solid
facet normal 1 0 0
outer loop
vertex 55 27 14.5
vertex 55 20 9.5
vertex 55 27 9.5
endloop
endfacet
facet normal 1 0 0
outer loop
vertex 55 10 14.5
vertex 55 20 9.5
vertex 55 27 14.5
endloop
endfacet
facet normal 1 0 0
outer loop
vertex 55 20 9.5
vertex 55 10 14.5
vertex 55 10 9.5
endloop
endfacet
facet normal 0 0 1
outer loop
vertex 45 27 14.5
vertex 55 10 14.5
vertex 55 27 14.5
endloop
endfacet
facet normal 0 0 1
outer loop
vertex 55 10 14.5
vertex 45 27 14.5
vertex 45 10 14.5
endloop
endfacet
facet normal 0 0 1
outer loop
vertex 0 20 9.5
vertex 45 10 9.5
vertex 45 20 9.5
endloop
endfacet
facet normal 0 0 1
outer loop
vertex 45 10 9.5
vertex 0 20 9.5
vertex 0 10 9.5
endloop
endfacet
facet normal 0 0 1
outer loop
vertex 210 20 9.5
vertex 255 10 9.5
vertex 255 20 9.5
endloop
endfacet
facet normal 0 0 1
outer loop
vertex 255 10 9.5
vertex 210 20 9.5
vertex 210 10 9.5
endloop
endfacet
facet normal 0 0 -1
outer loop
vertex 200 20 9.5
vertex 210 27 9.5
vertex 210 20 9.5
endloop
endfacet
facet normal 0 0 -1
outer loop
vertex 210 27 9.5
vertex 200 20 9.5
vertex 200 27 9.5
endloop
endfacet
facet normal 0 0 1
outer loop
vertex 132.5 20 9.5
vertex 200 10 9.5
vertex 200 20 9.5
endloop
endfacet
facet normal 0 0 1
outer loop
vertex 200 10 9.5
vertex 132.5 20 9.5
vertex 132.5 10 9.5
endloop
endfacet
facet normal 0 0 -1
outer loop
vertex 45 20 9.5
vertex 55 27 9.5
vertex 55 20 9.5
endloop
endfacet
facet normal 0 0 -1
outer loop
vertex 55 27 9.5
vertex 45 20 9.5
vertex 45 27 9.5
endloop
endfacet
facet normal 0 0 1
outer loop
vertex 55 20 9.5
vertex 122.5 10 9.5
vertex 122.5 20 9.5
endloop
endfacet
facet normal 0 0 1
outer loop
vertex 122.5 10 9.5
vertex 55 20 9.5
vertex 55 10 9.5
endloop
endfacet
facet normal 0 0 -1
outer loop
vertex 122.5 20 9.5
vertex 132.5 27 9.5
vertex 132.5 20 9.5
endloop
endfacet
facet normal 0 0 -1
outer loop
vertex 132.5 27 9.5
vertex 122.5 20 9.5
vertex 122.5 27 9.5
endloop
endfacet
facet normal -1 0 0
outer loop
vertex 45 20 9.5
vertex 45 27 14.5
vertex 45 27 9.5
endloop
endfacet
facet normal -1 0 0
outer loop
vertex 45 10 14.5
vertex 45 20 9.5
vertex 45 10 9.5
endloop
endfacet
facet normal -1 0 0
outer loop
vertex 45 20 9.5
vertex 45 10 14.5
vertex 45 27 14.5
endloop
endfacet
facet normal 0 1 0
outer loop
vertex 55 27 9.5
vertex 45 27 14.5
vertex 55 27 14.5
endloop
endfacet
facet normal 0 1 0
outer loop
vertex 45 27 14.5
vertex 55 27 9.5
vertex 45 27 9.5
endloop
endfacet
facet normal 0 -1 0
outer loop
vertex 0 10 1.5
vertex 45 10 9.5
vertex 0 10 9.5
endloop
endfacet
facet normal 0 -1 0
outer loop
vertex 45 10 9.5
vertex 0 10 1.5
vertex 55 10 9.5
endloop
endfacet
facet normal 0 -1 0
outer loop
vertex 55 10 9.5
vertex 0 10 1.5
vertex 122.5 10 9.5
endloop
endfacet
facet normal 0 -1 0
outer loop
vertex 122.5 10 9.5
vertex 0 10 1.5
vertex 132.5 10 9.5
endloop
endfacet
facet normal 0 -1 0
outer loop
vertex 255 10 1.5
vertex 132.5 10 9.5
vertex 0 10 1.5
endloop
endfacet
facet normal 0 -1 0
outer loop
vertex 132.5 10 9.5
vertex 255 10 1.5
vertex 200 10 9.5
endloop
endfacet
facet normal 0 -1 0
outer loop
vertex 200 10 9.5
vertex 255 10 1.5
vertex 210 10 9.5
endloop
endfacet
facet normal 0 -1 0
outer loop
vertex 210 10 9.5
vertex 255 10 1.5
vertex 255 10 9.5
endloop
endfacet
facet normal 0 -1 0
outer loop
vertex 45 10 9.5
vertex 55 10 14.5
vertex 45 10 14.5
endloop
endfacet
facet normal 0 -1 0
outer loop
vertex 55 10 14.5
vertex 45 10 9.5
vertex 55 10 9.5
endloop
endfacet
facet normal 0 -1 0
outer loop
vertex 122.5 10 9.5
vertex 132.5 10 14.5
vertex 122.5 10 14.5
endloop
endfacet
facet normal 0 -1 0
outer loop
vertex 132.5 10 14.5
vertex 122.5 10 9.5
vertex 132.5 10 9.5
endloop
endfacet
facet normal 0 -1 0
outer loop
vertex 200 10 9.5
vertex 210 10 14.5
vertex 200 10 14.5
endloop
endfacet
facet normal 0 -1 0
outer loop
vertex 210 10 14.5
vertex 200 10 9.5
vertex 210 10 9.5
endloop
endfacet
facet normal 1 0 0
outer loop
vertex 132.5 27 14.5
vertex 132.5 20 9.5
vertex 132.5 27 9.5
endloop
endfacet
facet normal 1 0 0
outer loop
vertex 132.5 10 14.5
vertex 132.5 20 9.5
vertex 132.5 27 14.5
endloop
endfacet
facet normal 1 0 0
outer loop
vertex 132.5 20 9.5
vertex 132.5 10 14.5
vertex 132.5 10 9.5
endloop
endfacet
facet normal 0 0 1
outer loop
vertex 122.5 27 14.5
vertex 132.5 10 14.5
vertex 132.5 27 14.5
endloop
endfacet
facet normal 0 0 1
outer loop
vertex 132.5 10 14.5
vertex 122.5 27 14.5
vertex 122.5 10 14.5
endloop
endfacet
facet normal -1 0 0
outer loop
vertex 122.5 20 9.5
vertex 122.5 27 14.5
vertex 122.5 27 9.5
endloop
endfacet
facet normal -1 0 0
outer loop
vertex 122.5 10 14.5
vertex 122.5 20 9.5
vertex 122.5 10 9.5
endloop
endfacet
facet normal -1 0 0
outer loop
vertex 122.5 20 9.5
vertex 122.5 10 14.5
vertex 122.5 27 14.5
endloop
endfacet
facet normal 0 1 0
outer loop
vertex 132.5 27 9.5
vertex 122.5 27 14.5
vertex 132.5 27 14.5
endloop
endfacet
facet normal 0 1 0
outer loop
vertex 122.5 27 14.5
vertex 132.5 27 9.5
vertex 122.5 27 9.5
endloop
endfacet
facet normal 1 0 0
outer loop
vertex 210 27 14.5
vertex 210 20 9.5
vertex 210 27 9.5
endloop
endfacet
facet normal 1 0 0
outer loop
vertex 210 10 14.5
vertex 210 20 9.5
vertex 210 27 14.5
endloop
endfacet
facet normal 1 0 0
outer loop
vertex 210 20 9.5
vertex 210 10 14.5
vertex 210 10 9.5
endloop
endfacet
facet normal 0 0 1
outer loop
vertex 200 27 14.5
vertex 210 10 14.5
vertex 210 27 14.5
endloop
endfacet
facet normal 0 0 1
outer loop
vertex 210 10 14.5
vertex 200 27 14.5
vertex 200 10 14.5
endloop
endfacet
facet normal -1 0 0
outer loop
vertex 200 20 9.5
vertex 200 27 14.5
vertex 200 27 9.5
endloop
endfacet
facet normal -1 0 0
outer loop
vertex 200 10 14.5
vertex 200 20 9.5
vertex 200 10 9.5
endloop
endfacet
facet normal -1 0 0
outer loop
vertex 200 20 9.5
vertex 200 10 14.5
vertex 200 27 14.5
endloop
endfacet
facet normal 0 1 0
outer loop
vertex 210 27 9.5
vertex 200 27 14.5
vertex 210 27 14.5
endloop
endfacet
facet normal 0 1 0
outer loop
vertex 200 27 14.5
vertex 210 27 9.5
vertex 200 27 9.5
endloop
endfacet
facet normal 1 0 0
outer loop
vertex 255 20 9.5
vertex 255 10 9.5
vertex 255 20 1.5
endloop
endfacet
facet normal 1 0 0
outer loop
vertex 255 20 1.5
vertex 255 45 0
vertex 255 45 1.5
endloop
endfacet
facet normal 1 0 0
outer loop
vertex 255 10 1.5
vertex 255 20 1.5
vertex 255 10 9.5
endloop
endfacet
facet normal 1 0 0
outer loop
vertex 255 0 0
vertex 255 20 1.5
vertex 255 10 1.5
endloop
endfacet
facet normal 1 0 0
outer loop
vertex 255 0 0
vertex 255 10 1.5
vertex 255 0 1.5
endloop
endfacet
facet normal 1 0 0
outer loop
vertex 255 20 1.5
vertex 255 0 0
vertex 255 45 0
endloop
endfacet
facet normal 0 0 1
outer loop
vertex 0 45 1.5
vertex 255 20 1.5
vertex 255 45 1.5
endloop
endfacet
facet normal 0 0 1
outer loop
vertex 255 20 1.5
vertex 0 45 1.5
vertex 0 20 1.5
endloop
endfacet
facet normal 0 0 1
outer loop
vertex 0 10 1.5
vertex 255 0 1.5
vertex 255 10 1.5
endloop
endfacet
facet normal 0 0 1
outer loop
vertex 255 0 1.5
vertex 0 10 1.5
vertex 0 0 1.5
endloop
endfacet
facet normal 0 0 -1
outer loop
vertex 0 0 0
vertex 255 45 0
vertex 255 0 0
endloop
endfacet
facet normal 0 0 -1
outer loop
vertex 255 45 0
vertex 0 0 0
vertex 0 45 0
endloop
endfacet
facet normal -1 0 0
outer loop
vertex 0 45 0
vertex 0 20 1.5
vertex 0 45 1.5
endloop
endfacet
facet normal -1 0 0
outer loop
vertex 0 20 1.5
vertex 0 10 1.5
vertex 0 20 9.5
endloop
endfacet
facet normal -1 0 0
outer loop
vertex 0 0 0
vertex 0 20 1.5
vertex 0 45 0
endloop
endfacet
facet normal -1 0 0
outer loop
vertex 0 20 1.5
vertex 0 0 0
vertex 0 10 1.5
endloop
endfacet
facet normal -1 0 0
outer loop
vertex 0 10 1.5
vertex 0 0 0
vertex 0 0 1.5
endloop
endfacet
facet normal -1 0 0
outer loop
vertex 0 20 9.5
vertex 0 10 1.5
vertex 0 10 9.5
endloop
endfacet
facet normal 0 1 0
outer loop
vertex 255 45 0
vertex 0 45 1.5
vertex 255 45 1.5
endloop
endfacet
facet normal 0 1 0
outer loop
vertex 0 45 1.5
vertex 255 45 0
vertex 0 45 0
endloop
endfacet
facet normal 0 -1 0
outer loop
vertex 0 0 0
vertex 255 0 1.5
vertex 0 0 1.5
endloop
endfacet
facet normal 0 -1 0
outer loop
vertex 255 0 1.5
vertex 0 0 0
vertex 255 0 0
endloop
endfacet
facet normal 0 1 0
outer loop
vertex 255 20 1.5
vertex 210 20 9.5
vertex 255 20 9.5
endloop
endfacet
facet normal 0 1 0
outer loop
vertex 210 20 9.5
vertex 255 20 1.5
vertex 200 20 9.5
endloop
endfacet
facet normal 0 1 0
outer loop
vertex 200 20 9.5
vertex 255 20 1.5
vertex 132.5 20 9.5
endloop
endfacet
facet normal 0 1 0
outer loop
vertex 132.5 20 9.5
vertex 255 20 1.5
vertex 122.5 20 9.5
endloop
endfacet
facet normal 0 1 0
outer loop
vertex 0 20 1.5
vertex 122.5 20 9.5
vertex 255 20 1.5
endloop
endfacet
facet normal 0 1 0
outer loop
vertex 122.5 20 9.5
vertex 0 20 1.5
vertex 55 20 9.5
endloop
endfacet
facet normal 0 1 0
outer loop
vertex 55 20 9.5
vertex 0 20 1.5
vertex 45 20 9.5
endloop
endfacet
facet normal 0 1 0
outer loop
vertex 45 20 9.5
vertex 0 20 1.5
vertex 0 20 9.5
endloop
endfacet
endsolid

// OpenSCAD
hh = 25;        // hooks height
pl = 259-2*2;   // plane length
sw = 10;        // support width

// main plane (to be glued to the wall)
cube([pl, 45, 1.5]);
// support shelf
translate([0, 10, 1.5])
  cube([pl, 10, 8]);

// hooks
for(x = [45, pl/2-sw/2, pl-45-sw])
  translate([x, 10, 1.5+8])
    cube([10, 10+7, 5]);
